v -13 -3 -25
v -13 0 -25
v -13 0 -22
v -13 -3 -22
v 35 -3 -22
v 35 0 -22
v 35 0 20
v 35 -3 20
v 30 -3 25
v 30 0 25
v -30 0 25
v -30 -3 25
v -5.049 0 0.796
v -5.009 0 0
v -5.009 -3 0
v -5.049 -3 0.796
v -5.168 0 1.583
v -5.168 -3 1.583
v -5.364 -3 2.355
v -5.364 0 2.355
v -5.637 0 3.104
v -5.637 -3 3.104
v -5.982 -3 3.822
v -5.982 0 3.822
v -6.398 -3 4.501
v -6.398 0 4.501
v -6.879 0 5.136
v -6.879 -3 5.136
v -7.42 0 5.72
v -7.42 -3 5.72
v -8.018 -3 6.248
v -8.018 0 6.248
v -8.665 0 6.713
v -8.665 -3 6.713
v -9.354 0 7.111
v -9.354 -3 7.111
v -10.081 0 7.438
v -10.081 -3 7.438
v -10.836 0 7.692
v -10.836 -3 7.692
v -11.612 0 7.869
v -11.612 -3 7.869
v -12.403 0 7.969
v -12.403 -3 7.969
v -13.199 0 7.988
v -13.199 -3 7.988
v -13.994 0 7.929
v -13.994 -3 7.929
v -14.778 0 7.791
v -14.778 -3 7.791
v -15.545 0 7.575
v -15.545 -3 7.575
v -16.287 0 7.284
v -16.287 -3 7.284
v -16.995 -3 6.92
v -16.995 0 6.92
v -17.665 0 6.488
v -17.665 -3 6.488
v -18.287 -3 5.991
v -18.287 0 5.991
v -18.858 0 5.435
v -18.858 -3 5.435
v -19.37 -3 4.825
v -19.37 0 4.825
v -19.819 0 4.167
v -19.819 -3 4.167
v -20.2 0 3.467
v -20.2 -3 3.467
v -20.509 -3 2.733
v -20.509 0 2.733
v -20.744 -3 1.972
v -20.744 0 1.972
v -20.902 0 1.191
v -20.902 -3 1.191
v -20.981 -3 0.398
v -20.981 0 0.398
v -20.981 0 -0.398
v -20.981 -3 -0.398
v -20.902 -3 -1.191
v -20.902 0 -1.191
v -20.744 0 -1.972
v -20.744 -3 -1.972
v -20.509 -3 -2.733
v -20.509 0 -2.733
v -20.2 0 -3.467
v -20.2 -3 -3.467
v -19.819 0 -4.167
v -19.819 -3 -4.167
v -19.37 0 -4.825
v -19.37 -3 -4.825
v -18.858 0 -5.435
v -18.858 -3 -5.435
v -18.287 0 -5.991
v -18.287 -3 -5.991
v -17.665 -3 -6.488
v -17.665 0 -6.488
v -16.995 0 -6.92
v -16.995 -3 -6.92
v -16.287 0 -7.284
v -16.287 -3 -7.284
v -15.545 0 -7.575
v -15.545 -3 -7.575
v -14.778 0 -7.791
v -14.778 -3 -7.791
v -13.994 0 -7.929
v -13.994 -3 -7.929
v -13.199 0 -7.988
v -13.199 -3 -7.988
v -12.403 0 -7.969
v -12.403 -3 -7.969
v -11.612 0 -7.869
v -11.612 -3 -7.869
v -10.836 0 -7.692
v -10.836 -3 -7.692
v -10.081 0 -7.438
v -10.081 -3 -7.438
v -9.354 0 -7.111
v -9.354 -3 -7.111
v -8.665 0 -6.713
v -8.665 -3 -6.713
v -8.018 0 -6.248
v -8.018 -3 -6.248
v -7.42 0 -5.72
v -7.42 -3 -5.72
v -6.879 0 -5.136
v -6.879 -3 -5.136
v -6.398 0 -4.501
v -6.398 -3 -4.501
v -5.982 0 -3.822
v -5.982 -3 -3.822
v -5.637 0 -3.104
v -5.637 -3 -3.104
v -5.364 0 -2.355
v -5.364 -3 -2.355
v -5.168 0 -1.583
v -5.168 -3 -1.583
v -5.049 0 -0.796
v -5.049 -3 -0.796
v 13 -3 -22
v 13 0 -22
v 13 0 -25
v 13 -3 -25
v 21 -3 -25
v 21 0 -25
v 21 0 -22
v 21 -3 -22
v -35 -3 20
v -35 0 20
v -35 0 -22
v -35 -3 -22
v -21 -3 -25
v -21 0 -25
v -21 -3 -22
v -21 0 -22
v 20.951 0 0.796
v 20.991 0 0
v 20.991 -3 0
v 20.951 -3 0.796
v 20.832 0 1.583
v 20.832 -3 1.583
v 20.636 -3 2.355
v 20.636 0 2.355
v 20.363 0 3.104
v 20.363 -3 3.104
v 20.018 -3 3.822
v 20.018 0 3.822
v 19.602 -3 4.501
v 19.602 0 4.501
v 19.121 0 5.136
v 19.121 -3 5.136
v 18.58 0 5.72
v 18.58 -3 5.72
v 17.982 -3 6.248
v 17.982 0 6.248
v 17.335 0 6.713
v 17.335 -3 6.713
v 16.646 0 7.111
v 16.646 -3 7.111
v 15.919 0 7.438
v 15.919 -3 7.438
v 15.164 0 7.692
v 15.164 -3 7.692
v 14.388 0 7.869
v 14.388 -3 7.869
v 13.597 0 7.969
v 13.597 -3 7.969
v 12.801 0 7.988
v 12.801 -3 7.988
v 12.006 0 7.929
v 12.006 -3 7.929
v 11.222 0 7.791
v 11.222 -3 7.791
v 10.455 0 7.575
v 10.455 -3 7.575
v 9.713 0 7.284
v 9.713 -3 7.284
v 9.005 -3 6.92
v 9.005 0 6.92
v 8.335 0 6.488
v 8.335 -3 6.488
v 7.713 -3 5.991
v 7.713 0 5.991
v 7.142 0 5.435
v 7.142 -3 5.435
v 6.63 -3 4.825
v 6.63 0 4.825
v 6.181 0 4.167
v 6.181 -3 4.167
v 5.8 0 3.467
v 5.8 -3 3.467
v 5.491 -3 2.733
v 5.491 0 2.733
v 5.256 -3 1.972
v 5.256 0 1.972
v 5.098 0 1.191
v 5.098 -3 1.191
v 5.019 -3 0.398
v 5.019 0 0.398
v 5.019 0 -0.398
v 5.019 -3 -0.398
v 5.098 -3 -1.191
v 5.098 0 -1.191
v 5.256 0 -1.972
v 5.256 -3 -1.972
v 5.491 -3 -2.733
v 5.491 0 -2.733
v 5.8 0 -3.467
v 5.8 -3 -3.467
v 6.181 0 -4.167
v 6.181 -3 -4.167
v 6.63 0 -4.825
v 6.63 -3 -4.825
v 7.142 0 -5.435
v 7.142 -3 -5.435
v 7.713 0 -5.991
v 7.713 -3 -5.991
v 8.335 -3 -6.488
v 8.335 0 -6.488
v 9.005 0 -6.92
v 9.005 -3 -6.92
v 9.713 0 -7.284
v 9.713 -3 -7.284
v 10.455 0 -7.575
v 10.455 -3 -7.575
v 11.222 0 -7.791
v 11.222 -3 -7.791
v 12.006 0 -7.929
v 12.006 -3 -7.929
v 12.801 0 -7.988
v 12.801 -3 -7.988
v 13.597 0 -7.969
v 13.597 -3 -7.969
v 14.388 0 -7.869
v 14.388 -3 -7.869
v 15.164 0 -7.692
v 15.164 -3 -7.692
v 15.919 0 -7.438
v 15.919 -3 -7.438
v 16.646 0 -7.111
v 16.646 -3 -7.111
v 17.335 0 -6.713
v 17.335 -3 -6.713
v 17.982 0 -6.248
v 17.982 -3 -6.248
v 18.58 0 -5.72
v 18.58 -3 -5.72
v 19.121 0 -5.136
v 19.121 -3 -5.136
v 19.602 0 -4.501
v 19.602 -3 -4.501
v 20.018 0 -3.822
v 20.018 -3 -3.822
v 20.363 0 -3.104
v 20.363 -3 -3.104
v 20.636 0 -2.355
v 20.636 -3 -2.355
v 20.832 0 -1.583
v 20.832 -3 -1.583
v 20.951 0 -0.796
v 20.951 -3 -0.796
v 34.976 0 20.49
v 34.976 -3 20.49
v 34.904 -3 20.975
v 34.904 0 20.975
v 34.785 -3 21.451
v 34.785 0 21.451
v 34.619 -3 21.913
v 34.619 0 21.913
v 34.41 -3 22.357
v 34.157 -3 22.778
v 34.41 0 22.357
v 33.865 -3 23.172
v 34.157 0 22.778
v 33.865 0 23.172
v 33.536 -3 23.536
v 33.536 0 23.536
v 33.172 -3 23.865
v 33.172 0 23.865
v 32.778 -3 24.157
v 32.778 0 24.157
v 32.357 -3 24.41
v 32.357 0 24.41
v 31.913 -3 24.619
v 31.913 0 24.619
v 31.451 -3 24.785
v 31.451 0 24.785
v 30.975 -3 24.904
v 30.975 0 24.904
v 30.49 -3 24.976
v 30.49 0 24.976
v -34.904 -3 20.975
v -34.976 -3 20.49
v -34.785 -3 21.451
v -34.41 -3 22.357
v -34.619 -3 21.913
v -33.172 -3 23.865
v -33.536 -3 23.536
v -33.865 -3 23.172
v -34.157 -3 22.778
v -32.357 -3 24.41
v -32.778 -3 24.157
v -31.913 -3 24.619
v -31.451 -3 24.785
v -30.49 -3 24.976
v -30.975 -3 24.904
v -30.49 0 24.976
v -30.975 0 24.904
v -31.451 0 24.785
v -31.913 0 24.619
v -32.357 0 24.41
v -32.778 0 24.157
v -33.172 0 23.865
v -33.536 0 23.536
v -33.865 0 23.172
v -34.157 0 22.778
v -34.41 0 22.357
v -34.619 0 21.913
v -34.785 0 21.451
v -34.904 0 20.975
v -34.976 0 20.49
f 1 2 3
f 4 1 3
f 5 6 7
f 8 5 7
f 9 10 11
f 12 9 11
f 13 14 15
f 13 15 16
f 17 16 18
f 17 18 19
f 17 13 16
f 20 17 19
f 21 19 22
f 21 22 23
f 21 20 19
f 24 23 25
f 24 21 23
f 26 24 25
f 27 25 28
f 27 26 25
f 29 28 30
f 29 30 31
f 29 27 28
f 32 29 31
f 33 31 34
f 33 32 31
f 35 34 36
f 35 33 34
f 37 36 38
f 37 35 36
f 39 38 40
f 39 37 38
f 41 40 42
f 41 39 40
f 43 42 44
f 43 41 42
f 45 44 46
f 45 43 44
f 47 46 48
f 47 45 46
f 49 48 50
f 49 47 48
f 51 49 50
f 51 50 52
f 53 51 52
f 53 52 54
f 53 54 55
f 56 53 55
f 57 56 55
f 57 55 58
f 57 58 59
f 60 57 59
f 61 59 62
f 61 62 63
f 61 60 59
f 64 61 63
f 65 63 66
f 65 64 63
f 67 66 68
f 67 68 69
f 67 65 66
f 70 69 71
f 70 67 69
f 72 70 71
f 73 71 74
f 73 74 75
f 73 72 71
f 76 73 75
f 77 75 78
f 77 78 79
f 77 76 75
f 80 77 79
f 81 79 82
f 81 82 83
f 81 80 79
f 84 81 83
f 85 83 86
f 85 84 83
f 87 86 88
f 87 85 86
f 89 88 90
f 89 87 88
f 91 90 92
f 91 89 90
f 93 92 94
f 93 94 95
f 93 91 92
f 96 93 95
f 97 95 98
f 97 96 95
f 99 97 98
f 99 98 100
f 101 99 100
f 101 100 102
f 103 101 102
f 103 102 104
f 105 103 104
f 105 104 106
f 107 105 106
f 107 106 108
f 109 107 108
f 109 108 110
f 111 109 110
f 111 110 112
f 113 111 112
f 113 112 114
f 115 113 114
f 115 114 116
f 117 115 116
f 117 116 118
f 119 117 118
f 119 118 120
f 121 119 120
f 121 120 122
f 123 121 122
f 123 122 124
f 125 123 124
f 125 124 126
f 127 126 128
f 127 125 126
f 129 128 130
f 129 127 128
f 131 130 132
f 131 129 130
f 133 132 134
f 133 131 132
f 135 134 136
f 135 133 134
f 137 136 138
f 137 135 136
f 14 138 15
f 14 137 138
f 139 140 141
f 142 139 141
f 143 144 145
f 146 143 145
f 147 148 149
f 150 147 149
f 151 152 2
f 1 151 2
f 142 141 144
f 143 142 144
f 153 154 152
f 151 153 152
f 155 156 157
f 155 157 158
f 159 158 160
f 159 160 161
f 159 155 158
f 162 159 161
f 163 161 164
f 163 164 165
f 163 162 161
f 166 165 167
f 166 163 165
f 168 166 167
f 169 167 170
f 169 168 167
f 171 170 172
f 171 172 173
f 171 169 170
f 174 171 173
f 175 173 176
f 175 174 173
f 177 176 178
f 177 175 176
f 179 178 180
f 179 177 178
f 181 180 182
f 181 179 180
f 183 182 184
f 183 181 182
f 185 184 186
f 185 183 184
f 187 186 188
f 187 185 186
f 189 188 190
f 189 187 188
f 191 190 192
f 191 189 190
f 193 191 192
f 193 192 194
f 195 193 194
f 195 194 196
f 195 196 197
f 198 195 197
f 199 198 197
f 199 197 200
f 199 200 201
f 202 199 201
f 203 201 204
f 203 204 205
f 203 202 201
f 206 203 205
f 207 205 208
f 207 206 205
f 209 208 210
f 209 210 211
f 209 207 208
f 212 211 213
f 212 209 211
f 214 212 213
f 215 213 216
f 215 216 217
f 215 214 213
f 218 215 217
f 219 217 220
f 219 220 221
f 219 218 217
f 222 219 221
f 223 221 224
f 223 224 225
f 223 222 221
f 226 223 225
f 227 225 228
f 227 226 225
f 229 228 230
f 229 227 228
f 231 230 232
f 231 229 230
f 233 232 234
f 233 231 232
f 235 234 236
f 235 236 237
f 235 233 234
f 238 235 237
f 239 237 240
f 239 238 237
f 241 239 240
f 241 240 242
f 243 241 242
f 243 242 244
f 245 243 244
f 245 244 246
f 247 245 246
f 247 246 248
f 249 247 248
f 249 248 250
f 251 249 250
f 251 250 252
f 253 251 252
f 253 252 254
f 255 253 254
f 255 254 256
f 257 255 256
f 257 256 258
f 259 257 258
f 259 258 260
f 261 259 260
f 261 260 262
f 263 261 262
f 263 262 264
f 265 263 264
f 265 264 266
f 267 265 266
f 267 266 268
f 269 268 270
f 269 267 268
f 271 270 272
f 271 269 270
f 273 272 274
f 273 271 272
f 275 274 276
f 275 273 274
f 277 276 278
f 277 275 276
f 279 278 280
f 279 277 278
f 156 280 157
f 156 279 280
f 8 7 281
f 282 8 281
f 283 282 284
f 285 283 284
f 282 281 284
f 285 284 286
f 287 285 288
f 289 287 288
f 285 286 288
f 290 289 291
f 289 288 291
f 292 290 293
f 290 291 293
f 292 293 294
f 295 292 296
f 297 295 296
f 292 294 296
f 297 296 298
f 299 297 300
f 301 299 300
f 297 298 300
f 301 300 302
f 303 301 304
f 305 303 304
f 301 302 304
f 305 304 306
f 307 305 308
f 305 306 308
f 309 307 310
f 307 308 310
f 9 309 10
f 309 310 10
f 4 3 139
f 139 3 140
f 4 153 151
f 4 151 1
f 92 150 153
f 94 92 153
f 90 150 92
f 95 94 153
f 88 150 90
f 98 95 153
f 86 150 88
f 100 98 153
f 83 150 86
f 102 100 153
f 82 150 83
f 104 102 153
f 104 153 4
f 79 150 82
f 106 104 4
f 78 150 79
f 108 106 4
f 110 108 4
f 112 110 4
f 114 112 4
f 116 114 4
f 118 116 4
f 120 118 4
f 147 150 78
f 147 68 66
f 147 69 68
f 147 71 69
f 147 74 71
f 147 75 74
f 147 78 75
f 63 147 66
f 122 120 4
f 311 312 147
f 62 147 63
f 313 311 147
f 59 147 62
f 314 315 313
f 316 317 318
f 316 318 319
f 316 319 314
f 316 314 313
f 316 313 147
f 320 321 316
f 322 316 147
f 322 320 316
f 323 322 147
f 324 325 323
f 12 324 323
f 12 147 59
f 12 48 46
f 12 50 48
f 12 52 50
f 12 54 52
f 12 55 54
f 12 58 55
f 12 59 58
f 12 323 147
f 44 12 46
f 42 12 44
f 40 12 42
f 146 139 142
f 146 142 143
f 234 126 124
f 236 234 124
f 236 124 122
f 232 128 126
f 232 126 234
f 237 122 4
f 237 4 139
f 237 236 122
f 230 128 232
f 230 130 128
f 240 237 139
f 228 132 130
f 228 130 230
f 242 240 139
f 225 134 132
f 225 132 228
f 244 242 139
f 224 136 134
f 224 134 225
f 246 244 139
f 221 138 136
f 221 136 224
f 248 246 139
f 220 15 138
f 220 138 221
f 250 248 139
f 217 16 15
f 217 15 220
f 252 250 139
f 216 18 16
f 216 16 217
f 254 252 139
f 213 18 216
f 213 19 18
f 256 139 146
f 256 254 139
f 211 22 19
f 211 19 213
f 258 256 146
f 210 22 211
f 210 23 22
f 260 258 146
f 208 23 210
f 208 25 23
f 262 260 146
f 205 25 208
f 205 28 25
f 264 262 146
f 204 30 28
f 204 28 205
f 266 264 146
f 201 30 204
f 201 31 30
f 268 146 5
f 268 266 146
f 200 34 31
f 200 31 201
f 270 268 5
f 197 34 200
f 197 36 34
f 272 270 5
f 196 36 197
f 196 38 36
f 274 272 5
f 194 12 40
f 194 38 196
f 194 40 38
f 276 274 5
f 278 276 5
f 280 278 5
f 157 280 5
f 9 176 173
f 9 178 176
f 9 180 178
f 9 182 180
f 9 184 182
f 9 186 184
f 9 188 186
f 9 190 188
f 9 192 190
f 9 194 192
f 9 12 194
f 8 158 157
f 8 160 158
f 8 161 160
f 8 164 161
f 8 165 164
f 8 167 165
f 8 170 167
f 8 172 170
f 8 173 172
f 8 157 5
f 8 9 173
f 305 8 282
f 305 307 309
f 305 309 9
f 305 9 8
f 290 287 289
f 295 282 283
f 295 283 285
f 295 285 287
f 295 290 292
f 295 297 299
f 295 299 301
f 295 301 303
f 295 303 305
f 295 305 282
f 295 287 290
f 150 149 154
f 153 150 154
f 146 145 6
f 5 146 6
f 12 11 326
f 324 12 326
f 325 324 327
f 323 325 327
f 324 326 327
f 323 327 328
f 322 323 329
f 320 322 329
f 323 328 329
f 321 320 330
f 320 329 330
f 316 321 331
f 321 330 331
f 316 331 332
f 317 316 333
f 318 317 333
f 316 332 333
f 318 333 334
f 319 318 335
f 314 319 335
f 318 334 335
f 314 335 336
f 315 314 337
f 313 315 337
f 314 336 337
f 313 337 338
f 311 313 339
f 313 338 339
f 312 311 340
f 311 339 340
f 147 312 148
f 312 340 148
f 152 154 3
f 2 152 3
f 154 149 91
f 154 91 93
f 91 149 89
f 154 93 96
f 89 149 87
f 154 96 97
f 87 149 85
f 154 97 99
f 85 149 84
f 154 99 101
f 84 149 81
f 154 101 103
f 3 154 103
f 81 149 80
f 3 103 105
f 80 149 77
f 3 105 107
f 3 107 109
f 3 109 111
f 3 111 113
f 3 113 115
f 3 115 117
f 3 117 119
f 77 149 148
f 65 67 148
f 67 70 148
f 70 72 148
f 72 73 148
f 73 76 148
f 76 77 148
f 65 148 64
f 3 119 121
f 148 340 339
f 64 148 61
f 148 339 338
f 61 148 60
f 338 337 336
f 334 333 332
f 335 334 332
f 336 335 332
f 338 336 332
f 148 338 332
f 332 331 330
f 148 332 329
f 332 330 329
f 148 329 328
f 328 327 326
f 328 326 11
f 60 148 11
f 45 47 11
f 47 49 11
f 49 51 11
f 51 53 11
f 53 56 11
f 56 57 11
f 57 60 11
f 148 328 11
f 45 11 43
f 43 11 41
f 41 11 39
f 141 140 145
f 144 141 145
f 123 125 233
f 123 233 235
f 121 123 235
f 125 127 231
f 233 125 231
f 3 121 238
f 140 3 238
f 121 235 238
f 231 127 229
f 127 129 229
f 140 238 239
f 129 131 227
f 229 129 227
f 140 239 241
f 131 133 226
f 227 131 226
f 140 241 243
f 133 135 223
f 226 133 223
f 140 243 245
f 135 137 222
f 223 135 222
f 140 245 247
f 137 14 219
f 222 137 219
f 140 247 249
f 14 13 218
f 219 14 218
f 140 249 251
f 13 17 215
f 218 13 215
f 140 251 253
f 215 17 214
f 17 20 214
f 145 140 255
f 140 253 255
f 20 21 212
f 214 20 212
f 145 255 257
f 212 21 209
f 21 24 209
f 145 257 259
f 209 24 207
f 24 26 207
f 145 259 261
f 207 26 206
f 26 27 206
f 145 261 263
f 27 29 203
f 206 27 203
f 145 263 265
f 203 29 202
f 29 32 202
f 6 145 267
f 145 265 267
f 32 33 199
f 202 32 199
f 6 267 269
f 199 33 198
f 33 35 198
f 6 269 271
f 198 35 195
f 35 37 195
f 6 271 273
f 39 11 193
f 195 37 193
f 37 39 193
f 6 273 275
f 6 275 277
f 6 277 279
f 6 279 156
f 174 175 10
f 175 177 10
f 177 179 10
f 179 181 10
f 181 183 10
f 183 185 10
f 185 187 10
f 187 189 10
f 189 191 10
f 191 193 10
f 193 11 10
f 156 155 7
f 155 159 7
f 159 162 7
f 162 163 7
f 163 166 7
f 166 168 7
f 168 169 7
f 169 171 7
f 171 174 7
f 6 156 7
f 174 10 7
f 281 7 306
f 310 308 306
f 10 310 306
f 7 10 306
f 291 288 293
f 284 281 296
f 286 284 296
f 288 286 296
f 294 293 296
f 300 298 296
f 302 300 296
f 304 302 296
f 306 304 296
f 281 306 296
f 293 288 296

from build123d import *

# Parameters (mm, degrees)
F0_R     = 7.990862
F1_DEPTH = 3


with BuildPart() as f1:
    # F0 (on Front) → F1 (new body)
    with BuildSketch(Plane.XZ):
        with BuildLine():
            Line((30, 25), (-30, 25))
            ThreePointArc((-30, 25), (-33.535534, 23.535534), (-35, 20))
            Line((-35, 20), (-35, -22))
            Line((-35, -22), (-21, -22))
            Line((-21, -22), (-21, -25))
            Line((-21, -25), (-13, -25))
            Line((-13, -25), (-13, -22))
            Line((-13, -22), (13, -22))
            Line((13, -22), (13, -25))
            Line((13, -25), (21, -25))
            Line((21, -25), (21, -22))
            Line((21, -22), (35, -22))
            Line((35, -22), (35, 20))
            ThreePointArc((35, 20), (33.535534, 23.535534), (30, 25))
        make_face()
        with Locations((-13, 0)):
            Circle(F0_R, mode=Mode.SUBTRACT)
        with Locations((13, 0)):
            Circle(F0_R, mode=Mode.SUBTRACT)
    extrude(amount=F1_DEPTH)


solid = f1.part
